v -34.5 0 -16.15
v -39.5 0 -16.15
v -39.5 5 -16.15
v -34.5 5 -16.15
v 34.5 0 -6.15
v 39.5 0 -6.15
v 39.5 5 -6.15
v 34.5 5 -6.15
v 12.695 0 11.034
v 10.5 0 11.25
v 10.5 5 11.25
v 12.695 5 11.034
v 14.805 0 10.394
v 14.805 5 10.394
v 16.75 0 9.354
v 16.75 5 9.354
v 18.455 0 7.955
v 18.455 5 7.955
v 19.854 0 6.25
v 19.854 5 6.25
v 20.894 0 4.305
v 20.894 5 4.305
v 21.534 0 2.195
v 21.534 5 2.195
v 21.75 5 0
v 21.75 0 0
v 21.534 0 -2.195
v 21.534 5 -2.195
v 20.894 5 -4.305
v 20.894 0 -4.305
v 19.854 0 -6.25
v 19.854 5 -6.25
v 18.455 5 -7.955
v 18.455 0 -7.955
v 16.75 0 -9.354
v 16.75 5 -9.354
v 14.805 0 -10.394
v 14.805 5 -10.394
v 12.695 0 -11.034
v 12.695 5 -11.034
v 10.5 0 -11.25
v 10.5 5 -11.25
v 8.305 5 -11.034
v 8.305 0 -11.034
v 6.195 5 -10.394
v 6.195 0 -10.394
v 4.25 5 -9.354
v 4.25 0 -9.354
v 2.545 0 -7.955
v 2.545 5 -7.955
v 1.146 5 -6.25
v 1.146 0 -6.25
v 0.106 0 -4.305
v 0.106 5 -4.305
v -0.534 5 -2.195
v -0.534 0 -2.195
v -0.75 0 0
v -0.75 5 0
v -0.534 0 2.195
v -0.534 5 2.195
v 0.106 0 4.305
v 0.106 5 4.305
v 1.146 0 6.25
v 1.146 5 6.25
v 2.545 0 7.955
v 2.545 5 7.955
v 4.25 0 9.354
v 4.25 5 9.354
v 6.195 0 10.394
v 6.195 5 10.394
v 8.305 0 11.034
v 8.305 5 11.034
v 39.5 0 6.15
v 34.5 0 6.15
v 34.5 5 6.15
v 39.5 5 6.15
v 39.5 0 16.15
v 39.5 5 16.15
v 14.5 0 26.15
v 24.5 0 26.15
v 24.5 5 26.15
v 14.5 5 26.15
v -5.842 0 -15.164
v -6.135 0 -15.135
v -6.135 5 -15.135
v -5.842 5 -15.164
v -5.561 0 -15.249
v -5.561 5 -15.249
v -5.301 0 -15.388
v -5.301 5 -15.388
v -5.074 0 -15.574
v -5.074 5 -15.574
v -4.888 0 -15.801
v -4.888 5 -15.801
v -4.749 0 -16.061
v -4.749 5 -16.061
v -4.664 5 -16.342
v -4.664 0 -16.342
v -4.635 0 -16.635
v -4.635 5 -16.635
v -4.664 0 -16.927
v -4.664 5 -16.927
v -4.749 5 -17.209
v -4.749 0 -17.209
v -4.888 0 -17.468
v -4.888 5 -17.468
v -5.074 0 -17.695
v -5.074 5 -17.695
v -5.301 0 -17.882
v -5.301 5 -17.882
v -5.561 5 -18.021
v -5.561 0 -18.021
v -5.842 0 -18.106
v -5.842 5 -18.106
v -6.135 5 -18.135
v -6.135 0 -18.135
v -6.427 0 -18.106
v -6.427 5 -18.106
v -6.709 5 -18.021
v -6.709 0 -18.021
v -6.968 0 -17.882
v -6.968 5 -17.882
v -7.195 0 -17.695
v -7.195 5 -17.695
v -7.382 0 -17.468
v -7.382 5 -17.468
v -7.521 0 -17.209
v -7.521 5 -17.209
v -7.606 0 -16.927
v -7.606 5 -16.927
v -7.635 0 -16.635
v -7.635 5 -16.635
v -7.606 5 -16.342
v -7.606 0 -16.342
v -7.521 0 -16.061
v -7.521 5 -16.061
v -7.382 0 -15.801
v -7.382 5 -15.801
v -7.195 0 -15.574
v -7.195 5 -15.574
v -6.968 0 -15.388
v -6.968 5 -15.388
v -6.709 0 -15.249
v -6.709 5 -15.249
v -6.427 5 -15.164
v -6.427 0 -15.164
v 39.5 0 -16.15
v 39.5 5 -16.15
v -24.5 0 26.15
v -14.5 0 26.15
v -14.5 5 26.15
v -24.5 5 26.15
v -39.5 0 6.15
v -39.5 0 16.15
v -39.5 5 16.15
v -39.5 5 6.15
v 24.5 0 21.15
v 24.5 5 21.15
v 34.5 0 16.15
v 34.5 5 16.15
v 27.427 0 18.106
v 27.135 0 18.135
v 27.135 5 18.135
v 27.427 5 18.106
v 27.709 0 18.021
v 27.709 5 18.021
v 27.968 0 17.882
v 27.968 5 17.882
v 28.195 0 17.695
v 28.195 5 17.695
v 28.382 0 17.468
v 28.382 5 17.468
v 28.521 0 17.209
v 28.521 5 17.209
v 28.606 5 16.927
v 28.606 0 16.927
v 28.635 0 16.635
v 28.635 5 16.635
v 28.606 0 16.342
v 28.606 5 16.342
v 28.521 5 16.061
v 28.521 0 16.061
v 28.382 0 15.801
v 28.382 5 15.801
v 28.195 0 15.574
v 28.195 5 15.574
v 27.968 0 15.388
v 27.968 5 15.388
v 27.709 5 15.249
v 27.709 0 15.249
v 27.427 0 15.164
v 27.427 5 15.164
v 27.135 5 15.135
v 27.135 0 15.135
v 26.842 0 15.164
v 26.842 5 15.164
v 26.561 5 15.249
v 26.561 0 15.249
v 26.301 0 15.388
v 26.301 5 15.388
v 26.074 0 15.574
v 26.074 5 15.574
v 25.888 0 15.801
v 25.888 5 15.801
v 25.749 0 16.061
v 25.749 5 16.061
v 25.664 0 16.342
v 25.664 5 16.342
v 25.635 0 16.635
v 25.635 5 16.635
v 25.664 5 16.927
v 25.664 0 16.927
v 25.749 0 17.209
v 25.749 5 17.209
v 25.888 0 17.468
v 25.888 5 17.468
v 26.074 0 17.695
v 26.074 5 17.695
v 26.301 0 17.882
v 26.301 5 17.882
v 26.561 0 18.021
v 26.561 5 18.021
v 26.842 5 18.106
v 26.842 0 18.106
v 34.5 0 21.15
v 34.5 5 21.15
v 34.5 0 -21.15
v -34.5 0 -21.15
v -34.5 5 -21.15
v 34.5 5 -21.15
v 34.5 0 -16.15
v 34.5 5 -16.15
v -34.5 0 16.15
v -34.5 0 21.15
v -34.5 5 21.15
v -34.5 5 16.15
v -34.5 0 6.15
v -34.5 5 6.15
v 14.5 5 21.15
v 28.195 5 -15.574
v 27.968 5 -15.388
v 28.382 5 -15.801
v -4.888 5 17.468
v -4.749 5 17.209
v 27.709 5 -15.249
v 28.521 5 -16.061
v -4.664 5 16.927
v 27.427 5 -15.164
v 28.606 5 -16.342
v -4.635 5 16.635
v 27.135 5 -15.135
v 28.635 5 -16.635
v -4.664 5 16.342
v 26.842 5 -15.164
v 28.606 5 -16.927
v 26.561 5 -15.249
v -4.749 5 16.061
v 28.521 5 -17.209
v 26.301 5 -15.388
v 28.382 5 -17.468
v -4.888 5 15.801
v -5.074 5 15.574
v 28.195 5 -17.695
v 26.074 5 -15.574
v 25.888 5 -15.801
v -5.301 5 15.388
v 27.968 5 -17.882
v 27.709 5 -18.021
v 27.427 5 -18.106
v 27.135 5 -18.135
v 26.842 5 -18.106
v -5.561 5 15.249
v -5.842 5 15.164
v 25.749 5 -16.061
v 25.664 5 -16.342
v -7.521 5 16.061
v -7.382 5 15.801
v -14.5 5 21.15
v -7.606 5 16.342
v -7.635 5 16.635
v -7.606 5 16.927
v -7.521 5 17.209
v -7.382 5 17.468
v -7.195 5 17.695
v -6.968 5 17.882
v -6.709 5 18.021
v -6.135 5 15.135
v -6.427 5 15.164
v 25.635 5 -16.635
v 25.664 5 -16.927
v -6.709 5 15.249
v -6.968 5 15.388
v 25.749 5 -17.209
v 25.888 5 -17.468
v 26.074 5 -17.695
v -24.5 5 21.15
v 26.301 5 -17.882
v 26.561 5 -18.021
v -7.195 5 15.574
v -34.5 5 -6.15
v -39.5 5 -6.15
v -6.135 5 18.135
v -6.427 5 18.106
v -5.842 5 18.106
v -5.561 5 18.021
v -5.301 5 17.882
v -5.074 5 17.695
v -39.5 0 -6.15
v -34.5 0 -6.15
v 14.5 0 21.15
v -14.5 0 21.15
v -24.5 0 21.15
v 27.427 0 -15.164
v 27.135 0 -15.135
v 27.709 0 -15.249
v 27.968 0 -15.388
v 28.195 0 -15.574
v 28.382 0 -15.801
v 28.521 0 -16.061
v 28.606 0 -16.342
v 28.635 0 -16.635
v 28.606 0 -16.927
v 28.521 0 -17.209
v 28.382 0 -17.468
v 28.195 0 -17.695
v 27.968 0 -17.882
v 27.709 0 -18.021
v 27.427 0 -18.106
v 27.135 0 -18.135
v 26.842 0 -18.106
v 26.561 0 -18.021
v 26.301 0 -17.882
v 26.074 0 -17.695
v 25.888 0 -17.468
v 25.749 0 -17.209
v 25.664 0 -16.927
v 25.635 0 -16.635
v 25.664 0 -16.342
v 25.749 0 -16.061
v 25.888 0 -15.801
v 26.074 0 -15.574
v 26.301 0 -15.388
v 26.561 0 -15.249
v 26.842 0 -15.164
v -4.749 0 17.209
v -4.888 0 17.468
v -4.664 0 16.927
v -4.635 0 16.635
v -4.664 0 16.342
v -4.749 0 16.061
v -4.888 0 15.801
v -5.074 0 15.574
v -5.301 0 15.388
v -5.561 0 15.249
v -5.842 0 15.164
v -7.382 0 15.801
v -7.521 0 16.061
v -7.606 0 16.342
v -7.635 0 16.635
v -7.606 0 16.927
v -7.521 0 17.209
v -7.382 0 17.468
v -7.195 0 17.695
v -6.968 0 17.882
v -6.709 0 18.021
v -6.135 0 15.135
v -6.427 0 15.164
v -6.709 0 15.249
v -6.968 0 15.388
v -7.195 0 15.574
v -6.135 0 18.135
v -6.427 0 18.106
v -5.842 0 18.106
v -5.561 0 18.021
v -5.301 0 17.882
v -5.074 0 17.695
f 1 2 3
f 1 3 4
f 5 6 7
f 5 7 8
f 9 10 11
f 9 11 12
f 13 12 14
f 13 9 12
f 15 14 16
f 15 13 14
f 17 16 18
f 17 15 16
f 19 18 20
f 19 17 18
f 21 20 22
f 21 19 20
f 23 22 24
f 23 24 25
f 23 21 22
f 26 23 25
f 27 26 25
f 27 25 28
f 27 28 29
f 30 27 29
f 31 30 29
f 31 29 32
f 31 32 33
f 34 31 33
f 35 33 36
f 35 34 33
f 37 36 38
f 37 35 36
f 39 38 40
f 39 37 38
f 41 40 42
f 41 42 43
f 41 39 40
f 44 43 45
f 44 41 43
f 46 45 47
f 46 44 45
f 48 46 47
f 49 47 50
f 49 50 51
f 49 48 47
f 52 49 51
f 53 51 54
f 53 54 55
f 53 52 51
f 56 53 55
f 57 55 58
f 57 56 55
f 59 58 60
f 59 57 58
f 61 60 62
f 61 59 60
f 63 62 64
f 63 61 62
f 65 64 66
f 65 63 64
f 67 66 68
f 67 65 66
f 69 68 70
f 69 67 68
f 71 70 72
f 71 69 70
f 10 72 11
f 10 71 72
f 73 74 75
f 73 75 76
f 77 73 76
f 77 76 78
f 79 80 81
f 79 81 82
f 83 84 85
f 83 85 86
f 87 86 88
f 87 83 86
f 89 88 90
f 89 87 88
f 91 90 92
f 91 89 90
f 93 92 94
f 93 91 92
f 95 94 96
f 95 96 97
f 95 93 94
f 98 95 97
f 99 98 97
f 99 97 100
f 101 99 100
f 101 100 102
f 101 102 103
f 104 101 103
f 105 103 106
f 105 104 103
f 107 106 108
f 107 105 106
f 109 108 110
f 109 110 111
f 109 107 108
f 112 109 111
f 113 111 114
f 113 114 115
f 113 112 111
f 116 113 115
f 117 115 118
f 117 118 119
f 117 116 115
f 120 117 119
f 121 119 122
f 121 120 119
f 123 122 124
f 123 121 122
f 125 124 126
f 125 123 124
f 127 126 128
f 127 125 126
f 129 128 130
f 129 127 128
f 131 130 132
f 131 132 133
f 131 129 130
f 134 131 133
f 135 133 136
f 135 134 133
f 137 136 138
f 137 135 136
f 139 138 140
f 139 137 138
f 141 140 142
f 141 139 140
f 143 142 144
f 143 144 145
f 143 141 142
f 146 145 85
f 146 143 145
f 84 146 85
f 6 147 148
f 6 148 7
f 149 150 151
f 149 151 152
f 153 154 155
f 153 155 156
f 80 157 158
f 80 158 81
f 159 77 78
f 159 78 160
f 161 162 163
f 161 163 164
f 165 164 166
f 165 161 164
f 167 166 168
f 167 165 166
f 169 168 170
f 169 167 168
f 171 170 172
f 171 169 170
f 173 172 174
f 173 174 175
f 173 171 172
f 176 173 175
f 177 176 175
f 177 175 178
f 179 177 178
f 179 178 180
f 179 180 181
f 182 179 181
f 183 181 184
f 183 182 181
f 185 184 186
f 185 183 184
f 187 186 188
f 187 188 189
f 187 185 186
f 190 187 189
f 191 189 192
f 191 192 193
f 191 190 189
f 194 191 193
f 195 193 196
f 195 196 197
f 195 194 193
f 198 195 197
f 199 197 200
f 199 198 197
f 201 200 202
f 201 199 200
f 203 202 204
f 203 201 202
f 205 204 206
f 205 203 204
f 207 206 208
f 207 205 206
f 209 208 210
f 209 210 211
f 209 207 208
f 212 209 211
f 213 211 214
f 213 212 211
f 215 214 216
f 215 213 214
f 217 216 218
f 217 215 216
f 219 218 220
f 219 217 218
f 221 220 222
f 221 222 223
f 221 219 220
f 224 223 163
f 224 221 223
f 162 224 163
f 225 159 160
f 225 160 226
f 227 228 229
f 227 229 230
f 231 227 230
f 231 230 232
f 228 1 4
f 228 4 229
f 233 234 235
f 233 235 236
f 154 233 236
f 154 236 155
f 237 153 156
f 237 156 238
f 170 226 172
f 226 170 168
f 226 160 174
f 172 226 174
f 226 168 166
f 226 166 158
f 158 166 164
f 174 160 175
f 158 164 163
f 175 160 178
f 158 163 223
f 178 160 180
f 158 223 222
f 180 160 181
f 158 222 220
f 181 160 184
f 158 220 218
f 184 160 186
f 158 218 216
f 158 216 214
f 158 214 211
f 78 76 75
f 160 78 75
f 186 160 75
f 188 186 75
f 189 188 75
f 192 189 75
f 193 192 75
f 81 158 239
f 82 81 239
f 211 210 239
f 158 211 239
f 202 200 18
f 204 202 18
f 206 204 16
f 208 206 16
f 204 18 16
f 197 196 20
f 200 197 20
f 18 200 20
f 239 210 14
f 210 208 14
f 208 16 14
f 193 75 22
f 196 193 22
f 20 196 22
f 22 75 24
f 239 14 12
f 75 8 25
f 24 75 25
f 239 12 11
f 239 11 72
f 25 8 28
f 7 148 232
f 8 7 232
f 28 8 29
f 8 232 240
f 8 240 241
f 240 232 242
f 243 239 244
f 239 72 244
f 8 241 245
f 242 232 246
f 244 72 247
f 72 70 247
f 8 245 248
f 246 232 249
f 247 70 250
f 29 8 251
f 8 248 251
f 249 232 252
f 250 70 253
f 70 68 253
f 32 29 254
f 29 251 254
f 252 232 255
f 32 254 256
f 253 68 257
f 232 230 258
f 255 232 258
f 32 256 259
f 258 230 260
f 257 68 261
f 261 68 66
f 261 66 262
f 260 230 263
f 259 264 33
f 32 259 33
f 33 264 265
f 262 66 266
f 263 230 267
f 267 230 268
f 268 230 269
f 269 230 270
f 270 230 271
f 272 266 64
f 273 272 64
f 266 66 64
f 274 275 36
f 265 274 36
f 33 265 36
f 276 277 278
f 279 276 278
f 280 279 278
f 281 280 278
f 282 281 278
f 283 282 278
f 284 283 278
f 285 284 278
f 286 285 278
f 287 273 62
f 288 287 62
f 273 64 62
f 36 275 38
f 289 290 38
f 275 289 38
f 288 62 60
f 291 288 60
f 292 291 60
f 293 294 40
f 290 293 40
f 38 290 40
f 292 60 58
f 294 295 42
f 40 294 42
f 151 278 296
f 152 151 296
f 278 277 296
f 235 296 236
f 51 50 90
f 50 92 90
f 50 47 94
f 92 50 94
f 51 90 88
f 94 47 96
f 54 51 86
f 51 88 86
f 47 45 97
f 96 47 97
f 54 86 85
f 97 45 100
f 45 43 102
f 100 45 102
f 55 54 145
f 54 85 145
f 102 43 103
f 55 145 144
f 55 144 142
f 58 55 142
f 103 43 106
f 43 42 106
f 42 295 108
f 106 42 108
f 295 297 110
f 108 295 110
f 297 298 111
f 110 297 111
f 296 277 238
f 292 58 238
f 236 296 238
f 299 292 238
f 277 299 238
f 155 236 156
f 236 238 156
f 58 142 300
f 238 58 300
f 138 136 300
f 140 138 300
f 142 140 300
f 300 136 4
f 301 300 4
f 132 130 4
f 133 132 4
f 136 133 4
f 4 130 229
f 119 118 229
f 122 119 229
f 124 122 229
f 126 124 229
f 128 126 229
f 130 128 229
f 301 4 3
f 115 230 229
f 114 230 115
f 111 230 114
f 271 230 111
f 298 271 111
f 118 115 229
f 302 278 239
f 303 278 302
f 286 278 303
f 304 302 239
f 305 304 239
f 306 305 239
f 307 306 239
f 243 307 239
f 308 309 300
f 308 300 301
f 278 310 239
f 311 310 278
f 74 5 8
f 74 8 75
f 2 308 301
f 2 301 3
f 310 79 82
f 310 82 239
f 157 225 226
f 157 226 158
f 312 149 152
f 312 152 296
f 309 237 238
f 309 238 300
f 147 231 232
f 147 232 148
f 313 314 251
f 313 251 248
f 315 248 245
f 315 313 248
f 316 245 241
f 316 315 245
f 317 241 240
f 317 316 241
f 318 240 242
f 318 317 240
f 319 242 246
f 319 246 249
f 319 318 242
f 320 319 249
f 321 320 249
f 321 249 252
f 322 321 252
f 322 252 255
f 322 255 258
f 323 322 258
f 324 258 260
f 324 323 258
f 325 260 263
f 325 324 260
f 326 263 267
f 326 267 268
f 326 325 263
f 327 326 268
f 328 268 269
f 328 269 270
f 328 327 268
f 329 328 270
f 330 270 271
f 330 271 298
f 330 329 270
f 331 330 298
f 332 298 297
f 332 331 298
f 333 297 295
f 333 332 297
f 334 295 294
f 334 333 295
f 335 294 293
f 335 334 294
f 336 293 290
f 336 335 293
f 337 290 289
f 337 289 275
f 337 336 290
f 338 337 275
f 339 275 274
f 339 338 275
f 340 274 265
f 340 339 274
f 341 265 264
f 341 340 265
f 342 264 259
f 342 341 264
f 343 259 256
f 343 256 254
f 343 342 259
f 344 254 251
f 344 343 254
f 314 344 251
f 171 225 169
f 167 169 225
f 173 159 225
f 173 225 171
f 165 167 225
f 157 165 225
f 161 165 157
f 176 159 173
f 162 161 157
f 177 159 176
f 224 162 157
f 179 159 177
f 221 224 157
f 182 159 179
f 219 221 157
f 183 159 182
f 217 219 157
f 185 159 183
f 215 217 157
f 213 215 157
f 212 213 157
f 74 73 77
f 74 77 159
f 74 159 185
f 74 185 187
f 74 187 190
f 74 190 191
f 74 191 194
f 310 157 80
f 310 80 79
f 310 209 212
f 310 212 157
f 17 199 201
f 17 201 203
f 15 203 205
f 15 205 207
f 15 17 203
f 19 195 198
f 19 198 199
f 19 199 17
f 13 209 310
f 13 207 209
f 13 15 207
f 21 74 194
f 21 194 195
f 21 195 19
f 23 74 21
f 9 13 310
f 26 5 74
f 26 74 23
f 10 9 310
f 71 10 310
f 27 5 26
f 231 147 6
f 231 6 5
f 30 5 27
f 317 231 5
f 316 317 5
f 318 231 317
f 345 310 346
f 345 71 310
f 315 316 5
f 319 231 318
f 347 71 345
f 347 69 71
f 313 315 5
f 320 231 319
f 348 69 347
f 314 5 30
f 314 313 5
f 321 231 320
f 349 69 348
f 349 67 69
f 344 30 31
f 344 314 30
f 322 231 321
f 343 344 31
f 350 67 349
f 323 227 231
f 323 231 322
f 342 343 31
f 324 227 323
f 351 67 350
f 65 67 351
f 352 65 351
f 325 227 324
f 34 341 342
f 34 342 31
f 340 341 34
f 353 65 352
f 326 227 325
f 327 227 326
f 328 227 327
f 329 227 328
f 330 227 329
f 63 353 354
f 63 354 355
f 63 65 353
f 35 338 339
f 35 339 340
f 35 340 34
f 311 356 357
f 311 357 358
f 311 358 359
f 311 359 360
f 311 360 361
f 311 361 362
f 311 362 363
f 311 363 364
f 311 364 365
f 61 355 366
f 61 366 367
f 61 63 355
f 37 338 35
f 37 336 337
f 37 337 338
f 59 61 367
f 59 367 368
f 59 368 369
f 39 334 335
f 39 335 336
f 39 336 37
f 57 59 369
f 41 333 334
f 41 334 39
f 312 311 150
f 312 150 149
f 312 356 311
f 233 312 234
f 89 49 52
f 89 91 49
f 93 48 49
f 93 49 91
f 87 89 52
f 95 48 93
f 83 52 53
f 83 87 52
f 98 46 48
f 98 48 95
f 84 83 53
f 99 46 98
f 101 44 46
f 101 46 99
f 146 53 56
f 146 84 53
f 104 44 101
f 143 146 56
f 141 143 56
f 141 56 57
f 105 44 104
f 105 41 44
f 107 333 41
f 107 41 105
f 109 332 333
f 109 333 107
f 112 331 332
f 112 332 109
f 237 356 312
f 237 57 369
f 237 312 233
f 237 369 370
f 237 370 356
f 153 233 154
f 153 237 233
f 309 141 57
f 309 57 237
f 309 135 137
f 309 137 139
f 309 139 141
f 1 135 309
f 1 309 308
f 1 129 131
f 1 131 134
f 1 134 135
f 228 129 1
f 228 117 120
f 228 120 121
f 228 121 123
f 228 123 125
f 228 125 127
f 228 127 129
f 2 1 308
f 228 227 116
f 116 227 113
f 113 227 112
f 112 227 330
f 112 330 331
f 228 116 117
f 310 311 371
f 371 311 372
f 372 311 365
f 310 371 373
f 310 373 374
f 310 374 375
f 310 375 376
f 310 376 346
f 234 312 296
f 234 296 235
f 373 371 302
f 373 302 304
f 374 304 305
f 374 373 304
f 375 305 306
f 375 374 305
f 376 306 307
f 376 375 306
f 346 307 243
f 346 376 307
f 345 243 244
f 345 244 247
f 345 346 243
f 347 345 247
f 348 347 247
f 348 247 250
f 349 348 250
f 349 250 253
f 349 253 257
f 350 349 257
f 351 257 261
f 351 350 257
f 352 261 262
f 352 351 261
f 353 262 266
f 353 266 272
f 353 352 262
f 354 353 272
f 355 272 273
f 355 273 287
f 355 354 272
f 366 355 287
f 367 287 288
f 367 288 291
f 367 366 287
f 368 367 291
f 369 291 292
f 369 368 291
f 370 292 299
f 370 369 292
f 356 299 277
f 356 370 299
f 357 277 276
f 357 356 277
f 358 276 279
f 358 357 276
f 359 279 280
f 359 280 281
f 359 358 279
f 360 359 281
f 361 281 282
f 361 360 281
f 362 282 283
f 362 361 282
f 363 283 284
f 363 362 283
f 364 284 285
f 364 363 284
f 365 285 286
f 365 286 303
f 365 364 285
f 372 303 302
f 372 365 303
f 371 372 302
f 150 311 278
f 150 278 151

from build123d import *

# Parameters (mm, degrees)
SKETCH_1_R      = 11.25
SKETCH_1_R_2    = 1.5
EXTRUDE_1_DEPTH = 5


with BuildPart() as part:
    # 草图1 → 凸台-拉伸1 (new body)
    with BuildSketch(Plane(origin=(0, 0, 0), x_dir=(1, 0, 0), z_dir=(0, 1, 0))):
        Polygon((-34.5, 21.15), (34.5, 21.15), (34.5, 16.15), (39.5, 16.15), (39.5, 6.15), (34.5, 6.15), (34.5, -6.15), (39.5, -6.15), (39.5, -16.15), (34.5, -16.15), (34.5, -21.15), (24.5, -21.15), (24.5, -26.15), (14.5, -26.15), (14.5, -21.15), (-14.5, -21.15), (-14.5, -26.15), (-24.5, -26.15), (-24.5, -21.15), (-34.5, -21.15), (-34.5, -16.15), (-39.5, -16.15), (-39.5, -6.15), (-34.5, -6.15), (-34.5, 6.15), (-39.5, 6.15), (-39.5, 16.15), (-34.5, 16.15), align=None)
        with Locations(Location((10.5, 0, 0), (0, 0, 270))):
            Circle(SKETCH_1_R, mode=Mode.SUBTRACT)
        with Locations(Location((-6.134831461, 16.634831461, 0), (0, 0, 270))):
            Circle(SKETCH_1_R_2, mode=Mode.SUBTRACT)
        with Locations(Location((27.134831461, 16.634831461, 0), (0, 0, 270))):
            Circle(SKETCH_1_R_2, mode=Mode.SUBTRACT)
        with Locations(Location((-6.134831461, -16.634831461, 0), (0, 0, 270))):
            Circle(SKETCH_1_R_2, mode=Mode.SUBTRACT)
        with Locations(Location((27.134831461, -16.634831461, 0), (0, 0, 270))):
            Circle(SKETCH_1_R_2, mode=Mode.SUBTRACT)
    extrude(amount=EXTRUDE_1_DEPTH)


solid = part.part
